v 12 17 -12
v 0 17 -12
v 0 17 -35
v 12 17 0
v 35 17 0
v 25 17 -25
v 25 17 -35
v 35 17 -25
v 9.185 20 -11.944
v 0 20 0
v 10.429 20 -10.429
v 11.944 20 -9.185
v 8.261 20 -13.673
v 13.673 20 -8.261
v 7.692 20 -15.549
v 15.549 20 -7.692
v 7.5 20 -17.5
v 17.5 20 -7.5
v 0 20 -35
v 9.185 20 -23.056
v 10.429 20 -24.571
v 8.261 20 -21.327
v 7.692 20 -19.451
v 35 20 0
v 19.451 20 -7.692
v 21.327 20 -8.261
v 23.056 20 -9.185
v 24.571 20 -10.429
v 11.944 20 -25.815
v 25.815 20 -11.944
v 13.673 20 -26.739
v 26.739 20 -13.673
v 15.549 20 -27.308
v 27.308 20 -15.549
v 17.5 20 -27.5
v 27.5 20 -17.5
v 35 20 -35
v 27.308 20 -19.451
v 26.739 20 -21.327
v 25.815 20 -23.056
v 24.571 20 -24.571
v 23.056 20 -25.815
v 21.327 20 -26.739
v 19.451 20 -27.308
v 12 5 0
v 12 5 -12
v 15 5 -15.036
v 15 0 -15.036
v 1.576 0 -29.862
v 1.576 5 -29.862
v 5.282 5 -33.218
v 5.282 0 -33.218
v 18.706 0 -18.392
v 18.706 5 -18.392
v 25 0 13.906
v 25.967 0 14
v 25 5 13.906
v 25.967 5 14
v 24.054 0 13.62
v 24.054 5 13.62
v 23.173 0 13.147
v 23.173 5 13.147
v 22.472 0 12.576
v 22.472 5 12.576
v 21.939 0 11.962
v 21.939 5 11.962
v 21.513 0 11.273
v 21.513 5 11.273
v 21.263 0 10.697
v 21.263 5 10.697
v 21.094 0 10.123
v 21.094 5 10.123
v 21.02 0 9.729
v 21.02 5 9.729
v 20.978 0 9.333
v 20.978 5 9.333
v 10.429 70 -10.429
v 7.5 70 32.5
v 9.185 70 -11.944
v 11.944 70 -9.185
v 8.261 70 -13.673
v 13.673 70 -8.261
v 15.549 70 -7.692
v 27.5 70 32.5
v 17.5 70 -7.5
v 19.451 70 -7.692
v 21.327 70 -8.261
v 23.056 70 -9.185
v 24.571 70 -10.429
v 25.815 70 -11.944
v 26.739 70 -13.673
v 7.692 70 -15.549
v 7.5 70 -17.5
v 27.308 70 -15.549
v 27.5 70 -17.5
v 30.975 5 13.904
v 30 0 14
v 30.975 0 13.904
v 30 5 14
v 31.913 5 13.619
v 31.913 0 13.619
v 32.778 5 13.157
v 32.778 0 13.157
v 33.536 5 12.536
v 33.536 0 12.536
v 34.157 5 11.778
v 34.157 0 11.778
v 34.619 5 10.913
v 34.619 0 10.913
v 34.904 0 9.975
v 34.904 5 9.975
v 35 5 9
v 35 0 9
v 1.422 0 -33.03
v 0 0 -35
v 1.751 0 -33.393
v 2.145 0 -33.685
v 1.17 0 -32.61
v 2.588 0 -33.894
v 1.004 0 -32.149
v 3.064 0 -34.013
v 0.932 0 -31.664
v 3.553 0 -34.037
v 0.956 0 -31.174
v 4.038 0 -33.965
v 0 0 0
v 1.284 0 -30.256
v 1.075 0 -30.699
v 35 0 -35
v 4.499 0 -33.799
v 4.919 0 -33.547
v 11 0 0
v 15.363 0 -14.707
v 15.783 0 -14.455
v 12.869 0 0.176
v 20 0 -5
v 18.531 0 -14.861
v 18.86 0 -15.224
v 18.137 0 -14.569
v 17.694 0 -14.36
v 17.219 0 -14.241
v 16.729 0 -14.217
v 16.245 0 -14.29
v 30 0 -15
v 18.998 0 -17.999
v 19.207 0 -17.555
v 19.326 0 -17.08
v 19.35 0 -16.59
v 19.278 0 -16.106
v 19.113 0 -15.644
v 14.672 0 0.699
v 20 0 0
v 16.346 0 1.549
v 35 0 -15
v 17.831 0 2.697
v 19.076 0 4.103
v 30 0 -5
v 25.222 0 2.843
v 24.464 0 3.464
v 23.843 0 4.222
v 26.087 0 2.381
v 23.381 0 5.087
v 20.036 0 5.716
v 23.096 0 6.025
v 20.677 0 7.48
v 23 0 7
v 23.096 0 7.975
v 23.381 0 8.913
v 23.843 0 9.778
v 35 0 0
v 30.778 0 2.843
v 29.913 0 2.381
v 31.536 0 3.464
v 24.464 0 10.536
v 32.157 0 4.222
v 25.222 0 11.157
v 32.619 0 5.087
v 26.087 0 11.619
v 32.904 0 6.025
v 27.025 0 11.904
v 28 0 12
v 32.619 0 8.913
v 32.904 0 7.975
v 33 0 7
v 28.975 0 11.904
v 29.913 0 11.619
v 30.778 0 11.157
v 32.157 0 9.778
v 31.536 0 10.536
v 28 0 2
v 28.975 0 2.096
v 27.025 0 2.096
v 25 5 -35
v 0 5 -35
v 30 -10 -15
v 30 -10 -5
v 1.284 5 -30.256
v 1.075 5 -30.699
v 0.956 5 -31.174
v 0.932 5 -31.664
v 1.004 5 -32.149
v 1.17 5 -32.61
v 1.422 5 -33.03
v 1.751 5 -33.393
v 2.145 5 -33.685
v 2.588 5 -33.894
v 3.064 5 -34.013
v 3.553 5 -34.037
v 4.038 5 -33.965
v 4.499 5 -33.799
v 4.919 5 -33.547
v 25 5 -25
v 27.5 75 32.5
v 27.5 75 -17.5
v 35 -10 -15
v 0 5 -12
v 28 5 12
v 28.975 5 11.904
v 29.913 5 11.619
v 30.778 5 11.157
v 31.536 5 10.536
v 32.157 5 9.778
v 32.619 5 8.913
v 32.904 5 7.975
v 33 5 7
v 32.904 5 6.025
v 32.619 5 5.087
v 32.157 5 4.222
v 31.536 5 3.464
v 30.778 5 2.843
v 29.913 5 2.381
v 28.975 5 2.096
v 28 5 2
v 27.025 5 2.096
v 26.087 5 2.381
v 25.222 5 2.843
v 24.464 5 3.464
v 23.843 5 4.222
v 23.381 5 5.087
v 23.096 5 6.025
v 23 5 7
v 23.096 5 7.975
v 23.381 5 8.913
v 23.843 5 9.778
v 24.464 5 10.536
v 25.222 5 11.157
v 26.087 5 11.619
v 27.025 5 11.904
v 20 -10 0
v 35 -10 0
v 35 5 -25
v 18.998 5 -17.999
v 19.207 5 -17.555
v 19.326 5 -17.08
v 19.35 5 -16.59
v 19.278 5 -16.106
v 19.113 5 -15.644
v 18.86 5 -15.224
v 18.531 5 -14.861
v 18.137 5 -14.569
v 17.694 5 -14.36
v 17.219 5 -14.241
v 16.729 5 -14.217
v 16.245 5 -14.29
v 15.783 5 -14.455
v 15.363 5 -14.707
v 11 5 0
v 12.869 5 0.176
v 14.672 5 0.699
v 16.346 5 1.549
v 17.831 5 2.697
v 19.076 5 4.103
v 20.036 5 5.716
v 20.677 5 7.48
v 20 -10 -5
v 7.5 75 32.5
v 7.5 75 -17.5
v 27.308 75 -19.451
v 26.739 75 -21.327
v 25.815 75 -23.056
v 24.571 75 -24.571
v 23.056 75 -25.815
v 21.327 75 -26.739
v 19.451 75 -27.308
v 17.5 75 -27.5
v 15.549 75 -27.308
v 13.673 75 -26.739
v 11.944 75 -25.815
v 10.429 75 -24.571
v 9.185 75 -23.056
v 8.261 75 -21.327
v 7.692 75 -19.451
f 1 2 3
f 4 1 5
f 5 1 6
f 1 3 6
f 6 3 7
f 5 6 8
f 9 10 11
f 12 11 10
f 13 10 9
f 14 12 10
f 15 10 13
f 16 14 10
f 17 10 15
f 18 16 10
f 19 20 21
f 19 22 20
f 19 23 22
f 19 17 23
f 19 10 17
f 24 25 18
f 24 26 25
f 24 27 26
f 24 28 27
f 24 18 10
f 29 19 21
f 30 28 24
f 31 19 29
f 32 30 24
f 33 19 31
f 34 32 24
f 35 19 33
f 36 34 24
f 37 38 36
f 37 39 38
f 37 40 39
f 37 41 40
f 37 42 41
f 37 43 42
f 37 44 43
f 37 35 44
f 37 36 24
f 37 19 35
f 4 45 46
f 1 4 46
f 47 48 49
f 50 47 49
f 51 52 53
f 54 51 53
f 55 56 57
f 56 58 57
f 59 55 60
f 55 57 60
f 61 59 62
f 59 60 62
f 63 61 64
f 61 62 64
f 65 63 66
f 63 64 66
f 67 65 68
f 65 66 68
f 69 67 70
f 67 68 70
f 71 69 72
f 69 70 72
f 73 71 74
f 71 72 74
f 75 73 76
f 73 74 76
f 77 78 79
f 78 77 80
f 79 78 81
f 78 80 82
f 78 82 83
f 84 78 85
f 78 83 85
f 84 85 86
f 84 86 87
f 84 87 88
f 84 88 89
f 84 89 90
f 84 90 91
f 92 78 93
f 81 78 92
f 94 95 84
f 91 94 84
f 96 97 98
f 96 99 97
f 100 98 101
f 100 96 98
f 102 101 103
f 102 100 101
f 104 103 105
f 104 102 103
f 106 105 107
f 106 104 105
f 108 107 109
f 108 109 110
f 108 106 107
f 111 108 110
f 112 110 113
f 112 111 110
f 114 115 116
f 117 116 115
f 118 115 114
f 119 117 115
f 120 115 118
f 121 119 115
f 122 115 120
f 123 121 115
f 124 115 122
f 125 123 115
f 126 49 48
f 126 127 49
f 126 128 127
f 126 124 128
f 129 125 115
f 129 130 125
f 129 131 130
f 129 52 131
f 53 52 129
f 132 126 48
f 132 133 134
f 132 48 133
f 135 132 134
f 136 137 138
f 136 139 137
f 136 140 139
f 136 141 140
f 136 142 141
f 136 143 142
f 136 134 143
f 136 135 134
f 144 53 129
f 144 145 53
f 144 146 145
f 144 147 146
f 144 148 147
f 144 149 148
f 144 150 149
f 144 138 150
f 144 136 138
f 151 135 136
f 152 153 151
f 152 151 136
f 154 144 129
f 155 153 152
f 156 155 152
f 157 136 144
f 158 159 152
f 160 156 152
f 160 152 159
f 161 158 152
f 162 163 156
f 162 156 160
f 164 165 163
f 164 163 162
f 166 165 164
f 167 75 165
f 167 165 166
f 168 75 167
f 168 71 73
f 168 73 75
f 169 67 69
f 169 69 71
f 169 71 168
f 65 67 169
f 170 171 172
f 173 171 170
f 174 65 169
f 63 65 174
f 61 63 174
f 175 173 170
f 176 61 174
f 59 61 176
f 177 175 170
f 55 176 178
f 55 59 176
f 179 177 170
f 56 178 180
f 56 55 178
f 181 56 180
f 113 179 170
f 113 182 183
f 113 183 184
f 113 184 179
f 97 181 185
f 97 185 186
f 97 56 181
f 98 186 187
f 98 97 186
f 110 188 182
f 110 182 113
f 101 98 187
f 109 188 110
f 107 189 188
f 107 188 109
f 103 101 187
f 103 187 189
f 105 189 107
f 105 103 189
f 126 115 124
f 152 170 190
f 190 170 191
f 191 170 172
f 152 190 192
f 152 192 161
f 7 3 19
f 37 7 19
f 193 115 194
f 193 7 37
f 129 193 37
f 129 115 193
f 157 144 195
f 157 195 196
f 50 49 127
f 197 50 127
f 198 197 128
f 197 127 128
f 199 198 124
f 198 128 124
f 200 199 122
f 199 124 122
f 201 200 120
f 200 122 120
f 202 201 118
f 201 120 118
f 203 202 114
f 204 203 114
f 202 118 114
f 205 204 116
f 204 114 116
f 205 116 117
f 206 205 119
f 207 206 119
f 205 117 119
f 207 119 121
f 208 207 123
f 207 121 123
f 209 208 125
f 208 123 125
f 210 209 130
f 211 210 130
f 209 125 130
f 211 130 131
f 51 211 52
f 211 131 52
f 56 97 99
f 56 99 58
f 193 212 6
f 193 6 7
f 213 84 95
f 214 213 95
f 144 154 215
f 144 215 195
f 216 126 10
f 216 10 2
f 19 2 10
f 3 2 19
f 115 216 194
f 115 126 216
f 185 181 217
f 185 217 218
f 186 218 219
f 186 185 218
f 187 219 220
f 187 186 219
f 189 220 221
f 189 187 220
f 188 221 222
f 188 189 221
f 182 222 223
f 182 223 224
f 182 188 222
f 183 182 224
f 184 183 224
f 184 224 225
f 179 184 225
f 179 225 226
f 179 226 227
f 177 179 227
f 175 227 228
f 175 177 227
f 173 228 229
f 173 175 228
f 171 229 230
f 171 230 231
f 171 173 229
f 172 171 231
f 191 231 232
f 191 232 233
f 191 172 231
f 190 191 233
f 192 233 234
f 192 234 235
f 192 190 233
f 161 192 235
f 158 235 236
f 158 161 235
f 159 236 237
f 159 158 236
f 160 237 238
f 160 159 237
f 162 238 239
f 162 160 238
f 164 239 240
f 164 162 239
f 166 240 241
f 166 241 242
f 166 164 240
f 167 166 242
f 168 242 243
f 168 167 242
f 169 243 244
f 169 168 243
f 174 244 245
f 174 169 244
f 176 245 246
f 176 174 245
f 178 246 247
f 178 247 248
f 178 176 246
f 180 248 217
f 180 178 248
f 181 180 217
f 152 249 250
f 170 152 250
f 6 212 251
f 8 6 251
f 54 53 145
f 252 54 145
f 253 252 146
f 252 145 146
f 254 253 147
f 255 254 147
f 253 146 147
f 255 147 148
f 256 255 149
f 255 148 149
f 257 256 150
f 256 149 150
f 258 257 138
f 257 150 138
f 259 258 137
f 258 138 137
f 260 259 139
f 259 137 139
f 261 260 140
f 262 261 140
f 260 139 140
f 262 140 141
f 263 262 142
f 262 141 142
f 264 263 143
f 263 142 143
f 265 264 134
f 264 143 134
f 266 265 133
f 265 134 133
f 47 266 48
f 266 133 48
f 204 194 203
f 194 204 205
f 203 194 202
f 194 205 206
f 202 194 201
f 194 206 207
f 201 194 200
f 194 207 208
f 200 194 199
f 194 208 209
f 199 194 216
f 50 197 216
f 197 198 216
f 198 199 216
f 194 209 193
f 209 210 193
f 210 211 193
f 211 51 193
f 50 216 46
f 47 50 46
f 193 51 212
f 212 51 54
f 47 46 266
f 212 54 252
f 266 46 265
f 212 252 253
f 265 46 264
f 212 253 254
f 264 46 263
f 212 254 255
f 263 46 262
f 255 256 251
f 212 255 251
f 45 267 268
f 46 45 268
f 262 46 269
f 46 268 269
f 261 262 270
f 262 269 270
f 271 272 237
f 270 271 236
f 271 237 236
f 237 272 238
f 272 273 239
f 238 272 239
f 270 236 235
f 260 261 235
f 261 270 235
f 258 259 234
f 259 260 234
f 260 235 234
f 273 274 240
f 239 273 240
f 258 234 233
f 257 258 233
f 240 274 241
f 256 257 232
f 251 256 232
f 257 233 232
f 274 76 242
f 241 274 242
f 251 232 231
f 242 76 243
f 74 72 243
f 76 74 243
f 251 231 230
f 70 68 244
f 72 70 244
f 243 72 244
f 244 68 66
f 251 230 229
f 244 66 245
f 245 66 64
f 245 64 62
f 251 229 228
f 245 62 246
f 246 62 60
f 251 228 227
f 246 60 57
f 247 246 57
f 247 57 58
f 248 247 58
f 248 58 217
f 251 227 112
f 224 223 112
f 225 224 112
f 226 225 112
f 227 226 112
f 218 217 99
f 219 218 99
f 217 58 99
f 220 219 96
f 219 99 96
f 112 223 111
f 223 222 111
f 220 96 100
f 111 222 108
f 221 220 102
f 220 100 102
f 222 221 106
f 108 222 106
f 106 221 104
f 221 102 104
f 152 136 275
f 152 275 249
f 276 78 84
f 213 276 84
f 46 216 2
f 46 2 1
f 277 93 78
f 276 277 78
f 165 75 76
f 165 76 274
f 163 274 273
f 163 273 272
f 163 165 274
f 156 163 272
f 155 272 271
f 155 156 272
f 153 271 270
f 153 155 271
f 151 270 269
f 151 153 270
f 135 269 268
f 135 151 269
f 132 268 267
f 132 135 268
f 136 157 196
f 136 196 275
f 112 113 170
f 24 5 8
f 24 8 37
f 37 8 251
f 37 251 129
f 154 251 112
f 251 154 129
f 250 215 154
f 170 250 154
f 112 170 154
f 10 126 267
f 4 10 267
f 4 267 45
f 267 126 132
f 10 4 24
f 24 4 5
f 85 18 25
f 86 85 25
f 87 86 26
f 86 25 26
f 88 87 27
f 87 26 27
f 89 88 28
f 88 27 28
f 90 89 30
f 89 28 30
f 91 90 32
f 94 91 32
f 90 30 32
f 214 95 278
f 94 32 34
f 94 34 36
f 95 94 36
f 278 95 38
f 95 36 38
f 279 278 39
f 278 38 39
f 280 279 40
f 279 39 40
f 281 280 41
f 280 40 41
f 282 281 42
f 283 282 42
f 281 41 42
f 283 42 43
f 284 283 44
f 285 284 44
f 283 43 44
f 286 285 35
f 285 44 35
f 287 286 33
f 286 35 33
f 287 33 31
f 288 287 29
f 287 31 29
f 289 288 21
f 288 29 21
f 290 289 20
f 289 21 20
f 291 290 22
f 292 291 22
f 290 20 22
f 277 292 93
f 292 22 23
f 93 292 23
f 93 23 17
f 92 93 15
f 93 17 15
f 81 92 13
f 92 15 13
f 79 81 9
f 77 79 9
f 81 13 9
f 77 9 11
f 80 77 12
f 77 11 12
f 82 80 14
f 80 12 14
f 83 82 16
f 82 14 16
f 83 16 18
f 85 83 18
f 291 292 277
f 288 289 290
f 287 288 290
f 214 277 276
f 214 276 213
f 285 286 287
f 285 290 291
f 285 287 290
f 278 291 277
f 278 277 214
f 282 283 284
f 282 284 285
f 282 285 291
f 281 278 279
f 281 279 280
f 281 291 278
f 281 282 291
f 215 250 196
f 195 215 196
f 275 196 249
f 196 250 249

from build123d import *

# Parameters (mm, degrees)
SKETCH1_R           = 5
BOSS_EXTRUDE1_DEPTH = 5
BOSS_EXTRUDE2_DEPTH = 10
SKETCH3_W           = 12
SKETCH3_H           = 12
SKETCH3_W_2         = 10
SKETCH3_H_2         = 10
BOSS_EXTRUDE3_DEPTH = 12
SKETCH4_W           = 35
SKETCH4_H           = 35
BOSS_EXTRUDE4_DEPTH = 3
SKETCH5_R           = 10
BOSS_EXTRUDE5_DEPTH = 50
BOSS_EXTRUDE6_DEPTH = 5
FILLET1_R           = 10
FILLET4_R           = 5


with BuildPart() as part:
    # Sketch1 → Boss-Extrude1 (new body)
    with BuildSketch(Plane(origin=(0, 0, 0), x_dir=(1, 0, 0), z_dir=(0, 1, 0))):
        Polygon((0, 0), (0, 35), (35, 35), (35, 0), (35, -14), (21, -14), (21, 0), align=None)
        with Locations(Location((28, -7, 0), (0, 0, 270))):
            Circle(SKETCH1_R, mode=Mode.SUBTRACT)
        with BuildLine():
            Line((5.28246111, 33.217874153), (18.706396214, 18.392289297))
            ThreePointArc((18.706396214, 18.392289297), (18.531189995, 14.861099302), (15, 15.036305521))
            Line((15, 15.036305521), (1.576064896, 29.861890377))
            ThreePointArc((1.576064896, 29.861890377), (1.751271115, 33.393080372), (5.28246111, 33.217874153))
        make_face(mode=Mode.SUBTRACT)
    extrude(amount=BOSS_EXTRUDE1_DEPTH)

    # Sketch2 → Boss-Extrude2 (add)
    with BuildSketch(Plane.XZ):
        Polygon((30, -5), (20, -5), (20, 0), (35, 0), (35, -15), (30, -15), align=None)
    extrude(amount=BOSS_EXTRUDE2_DEPTH)

    # Sketch3 → Boss-Extrude3 (add)
    with BuildSketch(Plane(origin=(0, 5, 0), x_dir=(1, 0, 0), z_dir=(0, 1, 0))):
        with Locations((6, 6)):
            Rectangle(SKETCH3_W, SKETCH3_H)
        with Locations((30, 30)):
            Rectangle(SKETCH3_W_2, SKETCH3_H_2)
    extrude(amount=BOSS_EXTRUDE3_DEPTH)

    # Sketch4 → Boss-Extrude4 (add)
    with BuildSketch(Plane(origin=(0, 17, 0), x_dir=(1, 0, 0), z_dir=(0, 1, 0))):
        with Locations((17.5, 17.5)):
            Rectangle(SKETCH4_W, SKETCH4_H)
    extrude(amount=BOSS_EXTRUDE4_DEPTH)

    # Sketch5 → Boss-Extrude5 (add)
    with BuildSketch(Plane(origin=(0, 20, 0), x_dir=(1, 0, 0), z_dir=(0, 1, 0))):
        with Locations(Location((17.5, 17.5, 0), (0, 0, 270))):
            Circle(SKETCH5_R)
    extrude(amount=BOSS_EXTRUDE5_DEPTH)

    # Sketch6 → Boss-Extrude6 (add)
    with BuildSketch(Plane(origin=(0, 70, 0), x_dir=(1, 0, 0), z_dir=(0, 1, 0))):
        with BuildLine():
            Line((7.5, 17.5), (7.5, -32.5))
            Line((7.5, -32.5), (27.5, -32.5))
            Line((27.5, -32.5), (27.5, 17.5))
            ThreePointArc((27.5, 17.5), (17.5, 27.5), (7.5, 17.5))
        make_face()
    extrude(amount=BOSS_EXTRUDE6_DEPTH)

    # Fillet1
    # the kernel refuses this fillet: 10 mm, written as the material it adds along each edge
    with BuildSketch(Plane(origin=(21, 0, 0), x_dir=(-1, 0, 0), z_dir=(0, 1, 0))) as fillet1_piece_1:
        with BuildLine():
            CenterArc((FILLET1_R, FILLET1_R), FILLET1_R, 180, 90)
            Line((0, FILLET1_R), (0, 0))
            Line((0, 0), (FILLET1_R, 0))
        make_face()
    extrude(amount=5)

    # Fillet4
    fillet4_edges = [part.edges().sort_by_distance(p)[0] for p in [
        (35, 2.5, 14),
        (21, 2.5, 14),
    ]]
    fillet(fillet4_edges, radius=FILLET4_R)


solid = part.part
